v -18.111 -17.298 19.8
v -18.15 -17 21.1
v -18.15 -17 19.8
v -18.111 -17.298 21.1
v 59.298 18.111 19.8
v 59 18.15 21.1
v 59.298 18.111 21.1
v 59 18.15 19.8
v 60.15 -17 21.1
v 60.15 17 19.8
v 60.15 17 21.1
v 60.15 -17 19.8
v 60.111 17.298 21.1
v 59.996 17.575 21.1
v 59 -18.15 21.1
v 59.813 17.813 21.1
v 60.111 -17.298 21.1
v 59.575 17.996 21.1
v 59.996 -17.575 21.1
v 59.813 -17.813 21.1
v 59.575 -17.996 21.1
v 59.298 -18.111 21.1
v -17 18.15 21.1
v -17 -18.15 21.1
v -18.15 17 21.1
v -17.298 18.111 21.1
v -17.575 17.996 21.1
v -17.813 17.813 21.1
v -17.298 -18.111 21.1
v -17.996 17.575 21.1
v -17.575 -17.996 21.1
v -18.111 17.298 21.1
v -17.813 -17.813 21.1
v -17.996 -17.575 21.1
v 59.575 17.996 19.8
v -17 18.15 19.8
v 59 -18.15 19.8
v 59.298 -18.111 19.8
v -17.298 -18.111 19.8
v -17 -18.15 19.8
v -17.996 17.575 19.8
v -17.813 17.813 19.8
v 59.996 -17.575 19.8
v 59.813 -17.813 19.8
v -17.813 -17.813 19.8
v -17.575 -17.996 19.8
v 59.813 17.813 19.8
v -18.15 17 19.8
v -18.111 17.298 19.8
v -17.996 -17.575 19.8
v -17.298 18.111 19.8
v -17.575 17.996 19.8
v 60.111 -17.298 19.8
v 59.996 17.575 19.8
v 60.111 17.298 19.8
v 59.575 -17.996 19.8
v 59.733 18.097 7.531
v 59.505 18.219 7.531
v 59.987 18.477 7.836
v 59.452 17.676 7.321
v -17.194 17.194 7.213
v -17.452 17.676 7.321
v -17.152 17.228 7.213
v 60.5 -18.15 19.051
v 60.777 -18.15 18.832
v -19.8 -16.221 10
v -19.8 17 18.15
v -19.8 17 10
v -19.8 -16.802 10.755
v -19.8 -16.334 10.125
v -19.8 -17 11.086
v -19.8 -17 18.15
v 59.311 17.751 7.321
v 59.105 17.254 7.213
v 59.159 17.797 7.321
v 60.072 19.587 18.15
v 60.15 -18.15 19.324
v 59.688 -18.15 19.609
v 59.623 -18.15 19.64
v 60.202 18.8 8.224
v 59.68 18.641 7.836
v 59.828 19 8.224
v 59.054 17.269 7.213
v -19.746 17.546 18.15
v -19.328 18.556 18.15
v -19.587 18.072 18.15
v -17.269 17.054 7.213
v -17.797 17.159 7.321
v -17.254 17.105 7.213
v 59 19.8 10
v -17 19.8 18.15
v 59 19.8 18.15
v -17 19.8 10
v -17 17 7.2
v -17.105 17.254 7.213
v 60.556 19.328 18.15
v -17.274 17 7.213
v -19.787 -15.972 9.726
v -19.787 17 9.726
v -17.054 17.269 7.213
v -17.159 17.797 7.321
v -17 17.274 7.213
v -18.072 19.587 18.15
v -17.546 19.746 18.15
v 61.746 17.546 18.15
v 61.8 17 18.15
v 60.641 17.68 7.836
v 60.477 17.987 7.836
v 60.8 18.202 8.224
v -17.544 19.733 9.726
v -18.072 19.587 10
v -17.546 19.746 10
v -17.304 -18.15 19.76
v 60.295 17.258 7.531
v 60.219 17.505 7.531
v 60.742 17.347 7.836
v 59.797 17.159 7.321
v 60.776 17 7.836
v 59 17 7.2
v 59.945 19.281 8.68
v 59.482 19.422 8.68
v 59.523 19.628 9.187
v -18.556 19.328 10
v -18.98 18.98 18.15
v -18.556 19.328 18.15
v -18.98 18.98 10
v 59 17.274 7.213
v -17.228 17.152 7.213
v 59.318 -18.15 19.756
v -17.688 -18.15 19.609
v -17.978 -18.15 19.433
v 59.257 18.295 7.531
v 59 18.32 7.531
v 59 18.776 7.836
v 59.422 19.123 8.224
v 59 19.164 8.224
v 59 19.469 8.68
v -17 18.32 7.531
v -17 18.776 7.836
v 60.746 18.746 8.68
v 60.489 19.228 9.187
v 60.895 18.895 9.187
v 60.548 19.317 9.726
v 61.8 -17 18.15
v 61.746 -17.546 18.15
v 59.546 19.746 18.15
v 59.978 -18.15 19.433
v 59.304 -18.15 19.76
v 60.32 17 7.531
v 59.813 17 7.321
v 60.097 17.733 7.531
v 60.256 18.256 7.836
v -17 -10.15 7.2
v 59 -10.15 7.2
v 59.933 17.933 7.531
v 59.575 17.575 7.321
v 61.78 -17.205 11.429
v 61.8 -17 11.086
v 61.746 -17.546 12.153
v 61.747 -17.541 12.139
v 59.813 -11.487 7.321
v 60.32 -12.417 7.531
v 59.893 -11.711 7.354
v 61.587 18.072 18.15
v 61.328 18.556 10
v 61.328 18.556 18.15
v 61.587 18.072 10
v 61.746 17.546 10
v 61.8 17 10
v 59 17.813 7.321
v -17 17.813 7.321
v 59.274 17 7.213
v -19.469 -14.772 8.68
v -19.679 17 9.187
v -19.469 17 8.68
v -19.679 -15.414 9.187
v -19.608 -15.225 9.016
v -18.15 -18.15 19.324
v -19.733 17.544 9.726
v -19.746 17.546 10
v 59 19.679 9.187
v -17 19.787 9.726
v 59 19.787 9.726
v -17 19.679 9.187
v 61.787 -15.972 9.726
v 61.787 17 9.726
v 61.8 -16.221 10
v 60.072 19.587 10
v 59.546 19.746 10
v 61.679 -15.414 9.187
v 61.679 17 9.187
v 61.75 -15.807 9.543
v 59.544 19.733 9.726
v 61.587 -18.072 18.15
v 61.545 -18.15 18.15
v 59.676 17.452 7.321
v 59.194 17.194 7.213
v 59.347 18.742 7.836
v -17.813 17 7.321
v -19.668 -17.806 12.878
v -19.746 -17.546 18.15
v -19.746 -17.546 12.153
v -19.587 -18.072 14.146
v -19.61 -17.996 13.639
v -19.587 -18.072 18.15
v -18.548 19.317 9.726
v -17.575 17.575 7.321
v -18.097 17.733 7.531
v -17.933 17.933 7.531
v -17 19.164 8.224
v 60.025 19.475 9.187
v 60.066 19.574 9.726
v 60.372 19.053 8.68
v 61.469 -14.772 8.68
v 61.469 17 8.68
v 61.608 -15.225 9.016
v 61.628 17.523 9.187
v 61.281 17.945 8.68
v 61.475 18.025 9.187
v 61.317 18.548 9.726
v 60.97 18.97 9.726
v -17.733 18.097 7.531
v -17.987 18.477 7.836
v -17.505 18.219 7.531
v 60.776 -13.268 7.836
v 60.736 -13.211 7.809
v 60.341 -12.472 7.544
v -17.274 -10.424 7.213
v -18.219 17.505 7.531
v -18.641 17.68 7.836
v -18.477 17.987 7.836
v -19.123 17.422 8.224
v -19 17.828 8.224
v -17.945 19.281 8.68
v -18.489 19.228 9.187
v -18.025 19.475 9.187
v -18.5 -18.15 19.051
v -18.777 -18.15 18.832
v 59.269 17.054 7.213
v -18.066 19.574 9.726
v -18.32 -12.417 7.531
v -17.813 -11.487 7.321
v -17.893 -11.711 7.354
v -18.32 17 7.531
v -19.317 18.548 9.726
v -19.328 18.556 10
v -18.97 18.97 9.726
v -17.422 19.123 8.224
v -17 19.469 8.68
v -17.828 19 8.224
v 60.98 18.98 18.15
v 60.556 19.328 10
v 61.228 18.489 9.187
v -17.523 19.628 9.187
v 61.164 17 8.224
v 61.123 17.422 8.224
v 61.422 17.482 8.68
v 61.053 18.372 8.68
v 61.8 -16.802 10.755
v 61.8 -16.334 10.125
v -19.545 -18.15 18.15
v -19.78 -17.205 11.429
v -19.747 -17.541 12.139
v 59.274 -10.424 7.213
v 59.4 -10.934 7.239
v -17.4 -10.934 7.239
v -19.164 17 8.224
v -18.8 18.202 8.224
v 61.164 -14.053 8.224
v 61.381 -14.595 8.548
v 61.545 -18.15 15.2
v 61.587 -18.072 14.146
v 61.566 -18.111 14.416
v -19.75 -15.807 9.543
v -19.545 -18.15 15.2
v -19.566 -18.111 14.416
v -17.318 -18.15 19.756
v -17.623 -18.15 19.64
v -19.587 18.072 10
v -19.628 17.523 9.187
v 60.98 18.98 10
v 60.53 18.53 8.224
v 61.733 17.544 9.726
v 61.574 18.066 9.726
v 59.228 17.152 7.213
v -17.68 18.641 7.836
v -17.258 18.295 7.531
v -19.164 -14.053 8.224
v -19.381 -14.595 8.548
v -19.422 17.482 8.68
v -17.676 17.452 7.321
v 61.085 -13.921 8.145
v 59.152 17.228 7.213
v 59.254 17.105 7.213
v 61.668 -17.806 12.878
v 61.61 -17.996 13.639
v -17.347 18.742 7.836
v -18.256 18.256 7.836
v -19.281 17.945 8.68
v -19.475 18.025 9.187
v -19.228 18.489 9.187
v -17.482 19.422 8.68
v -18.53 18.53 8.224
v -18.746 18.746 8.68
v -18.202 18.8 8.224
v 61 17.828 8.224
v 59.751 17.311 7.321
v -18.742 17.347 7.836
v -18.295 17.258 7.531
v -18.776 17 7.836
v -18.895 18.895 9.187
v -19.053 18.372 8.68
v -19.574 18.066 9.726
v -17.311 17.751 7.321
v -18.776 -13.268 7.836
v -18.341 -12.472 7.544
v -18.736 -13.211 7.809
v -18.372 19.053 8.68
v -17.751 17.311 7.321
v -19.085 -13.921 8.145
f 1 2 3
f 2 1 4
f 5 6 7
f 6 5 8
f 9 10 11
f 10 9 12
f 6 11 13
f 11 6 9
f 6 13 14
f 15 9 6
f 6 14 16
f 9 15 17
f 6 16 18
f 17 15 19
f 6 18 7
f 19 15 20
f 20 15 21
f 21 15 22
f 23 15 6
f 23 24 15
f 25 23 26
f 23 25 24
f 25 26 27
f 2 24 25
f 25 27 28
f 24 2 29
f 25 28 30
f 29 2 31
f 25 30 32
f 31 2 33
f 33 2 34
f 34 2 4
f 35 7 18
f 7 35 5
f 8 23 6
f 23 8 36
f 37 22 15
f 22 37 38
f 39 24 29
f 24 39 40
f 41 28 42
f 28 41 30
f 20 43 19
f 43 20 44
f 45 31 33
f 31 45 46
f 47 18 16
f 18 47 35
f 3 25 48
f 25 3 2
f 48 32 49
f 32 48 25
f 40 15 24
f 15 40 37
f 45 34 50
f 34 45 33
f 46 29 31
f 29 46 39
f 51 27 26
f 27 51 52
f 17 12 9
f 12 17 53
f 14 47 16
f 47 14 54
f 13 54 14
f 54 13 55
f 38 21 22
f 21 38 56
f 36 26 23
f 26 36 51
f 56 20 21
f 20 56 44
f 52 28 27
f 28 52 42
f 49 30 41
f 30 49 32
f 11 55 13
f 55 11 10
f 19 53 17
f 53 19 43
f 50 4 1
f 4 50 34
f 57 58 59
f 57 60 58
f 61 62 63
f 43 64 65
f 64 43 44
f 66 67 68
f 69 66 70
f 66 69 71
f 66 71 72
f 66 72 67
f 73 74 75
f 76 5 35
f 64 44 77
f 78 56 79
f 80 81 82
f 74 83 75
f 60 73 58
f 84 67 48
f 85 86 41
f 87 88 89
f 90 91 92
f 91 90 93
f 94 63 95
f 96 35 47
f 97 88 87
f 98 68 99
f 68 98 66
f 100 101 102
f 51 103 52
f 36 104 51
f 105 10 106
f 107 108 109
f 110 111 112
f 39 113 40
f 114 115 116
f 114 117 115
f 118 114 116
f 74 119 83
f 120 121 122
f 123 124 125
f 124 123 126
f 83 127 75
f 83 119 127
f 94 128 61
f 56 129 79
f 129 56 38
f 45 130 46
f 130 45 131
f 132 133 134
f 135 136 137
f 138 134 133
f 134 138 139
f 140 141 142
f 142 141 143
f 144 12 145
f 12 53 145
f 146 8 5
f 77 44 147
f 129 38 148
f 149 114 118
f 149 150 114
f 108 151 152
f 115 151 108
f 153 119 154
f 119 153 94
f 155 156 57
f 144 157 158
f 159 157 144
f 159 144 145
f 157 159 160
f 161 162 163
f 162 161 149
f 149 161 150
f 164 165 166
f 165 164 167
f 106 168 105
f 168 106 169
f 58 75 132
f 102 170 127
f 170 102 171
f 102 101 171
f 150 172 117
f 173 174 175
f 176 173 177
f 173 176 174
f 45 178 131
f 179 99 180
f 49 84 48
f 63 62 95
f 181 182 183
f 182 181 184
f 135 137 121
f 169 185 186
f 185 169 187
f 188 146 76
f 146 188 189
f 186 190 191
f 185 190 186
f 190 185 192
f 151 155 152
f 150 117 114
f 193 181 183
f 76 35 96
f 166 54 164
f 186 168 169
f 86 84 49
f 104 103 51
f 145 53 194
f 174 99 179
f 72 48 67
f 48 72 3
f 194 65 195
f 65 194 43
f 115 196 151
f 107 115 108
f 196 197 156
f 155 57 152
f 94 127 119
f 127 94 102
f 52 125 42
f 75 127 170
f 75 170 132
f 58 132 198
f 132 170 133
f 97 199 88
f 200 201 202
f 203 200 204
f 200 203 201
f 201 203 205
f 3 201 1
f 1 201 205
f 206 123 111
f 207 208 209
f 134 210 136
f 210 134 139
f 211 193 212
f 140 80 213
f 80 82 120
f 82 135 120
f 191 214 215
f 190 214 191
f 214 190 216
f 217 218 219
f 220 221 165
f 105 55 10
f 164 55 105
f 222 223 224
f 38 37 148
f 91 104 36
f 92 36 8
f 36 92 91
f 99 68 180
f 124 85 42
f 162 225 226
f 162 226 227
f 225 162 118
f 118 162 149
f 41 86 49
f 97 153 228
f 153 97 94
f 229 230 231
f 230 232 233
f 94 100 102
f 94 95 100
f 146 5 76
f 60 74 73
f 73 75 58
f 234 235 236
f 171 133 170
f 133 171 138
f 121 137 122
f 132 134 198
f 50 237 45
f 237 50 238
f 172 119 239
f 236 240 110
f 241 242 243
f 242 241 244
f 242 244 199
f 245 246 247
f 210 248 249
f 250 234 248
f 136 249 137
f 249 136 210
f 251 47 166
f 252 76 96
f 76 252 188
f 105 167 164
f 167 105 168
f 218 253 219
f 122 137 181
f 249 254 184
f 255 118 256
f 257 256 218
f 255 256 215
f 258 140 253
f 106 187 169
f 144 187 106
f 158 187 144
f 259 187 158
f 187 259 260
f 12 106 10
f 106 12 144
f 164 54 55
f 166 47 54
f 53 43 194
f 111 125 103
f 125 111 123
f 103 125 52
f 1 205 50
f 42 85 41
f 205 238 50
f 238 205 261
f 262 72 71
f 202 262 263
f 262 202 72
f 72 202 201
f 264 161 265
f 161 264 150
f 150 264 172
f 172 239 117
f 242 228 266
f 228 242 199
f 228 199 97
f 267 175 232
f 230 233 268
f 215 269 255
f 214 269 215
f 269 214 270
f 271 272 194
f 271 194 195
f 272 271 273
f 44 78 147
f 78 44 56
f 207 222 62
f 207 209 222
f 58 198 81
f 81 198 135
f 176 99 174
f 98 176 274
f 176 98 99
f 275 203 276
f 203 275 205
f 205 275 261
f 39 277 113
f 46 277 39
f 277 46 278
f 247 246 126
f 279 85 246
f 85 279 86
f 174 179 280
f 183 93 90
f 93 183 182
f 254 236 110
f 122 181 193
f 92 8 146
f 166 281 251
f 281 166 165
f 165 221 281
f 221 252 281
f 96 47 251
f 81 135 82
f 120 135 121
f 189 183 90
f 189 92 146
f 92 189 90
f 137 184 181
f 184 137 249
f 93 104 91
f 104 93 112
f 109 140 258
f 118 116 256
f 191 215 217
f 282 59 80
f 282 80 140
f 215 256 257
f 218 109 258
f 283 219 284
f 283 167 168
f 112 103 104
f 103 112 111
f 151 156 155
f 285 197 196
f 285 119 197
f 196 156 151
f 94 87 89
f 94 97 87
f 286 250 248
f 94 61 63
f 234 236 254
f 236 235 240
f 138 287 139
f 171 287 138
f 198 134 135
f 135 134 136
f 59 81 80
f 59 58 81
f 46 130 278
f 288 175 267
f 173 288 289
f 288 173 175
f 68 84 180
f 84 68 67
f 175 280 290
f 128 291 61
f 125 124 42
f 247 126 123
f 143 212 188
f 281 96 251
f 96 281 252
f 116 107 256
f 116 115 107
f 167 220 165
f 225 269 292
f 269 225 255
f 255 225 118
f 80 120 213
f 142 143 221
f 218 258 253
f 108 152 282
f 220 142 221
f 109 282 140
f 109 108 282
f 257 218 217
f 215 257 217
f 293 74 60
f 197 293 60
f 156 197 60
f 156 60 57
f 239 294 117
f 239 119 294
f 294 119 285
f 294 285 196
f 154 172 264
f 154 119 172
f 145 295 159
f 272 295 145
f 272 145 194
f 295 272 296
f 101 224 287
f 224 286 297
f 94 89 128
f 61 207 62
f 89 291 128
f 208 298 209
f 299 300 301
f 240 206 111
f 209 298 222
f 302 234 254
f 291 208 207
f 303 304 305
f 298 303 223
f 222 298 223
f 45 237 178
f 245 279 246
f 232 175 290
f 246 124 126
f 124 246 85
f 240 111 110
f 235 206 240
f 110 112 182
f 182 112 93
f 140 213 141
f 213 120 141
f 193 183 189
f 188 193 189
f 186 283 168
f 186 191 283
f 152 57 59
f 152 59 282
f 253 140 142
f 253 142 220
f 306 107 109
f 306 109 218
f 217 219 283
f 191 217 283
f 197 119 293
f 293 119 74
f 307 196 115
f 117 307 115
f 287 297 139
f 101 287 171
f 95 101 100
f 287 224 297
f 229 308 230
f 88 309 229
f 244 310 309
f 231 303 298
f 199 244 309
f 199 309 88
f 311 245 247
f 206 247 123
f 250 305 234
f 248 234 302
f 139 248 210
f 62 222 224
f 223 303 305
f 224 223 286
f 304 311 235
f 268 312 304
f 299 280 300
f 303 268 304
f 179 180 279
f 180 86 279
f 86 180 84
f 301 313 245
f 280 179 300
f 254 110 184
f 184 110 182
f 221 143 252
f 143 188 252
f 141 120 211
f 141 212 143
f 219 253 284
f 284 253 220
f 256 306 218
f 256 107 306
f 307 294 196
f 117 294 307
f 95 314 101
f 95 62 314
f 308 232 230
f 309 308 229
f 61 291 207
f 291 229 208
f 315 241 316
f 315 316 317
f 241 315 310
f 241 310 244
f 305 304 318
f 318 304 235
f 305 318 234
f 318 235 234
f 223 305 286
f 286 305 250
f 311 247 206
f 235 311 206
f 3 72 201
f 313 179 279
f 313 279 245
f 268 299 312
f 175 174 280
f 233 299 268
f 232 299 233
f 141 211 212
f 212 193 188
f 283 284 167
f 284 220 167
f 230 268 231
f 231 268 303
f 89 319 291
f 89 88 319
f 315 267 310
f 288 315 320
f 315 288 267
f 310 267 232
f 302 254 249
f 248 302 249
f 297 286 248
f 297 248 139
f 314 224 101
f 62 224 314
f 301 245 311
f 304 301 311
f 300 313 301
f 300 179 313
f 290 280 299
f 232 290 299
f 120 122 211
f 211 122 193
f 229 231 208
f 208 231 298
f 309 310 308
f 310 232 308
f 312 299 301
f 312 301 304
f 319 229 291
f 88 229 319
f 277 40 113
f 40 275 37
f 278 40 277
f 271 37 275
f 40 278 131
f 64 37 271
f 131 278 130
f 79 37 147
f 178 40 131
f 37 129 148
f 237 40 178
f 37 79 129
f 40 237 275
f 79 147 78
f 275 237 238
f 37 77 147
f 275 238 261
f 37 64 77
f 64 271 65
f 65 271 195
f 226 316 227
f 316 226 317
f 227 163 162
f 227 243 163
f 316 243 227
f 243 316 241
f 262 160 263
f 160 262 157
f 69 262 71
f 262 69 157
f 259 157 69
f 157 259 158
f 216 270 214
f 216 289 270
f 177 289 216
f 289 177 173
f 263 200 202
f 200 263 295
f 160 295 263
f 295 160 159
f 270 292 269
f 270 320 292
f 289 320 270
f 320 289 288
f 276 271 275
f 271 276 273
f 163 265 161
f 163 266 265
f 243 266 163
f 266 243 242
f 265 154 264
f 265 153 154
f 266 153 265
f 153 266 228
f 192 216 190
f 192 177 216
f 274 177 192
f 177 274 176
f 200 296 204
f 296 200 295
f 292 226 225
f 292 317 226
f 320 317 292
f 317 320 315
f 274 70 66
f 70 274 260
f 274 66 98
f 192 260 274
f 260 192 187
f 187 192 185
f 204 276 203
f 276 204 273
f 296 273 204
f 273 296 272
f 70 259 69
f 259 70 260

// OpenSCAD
include <gridfinity_modules.scad>

// X dimension subdivisions
default_chambers = 1;

// Include overhang for labeling
default_withLabel = "disabled"; //[disabled: no label, left: left aligned label, right: right aligned label, center: center aligned label, leftchamber: left aligned chamber label, rightchamber: right aligned chamber label, centerchamber: center aligned chamber label]
// Width of the label in number of units, or zero for full width
default_labelWidth = 0; // 0.01
// Include larger corner fillet
default_fingerslide = true;
// radius of the corner fillet
default_fingerslide_radius = 8;
// Set magnet diameter and depth to 0 to print without magnet holes
// (Zack's design uses magnet diameter of 6.5)
default_magnet_diameter = 6.5;  // .1
// (Zack's design uses depth of 6)
default_screw_depth = 6;
// Minimum thickness above cutouts in base (Zack's design is effectively 1.2)
default_floor_thickness = 1.2;
// Thickness of outer walls (Zack's design is 0.95 mm)
default_wall_thickness = 0.95;
// Use rectangular inset for better bridging/printability
default_hole_overhang_remedy = false;
// Save material with thinner floor (only if no magnets, screws, or finger-slide used)
default_efficient_floor = false;
// Half-pitch base pads for offset stacking
default_half_pitch = false;
// Might want to remove inner lip of cup
default_lip_style = "normal";
// Limit attachments (magnets and scres) to box corners for faster printing.
default_box_corner_attachments_only = false;
// Removes the base grid from inside the shape
default_flat_base = false;

basic_cup(
  num_x=2,
  num_y=1,
  num_z=3,
  chambers=default_chambers,
  withLabel=default_withLabel,
  labelWidth=default_labelWidth,
  magnet_diameter=default_magnet_diameter,
  screw_depth=default_screw_depth,
  floor_thickness=default_floor_thickness,
  wall_thickness=default_wall_thickness,
  hole_overhang_remedy=default_hole_overhang_remedy,
  efficient_floor=default_efficient_floor,
  half_pitch=default_half_pitch,
  lip_style=default_lip_style,
  box_corner_attachments_only=default_box_corner_attachments_only,
  flat_base = default_flat_base
);


// It's recommended that all parameters other than x, y, z size should be specified by keyword 
// and not by position.  The number of parameters makes positional parameters error prone, and
// additional parameters may be added over time and break things.
module basic_cup(
  num_x,
  num_y,
  num_z,
  chambers=default_chambers,
  withLabel=default_withLabel,
  labelWidth=default_labelWidth,
  fingerslide=default_fingerslide,
  fingerslide_radius=default_fingerslide_radius,
  magnet_diameter=default_magnet_diameter,
  screw_depth=default_screw_depth,
  floor_thickness=default_floor_thickness,
  wall_thickness=default_wall_thickness,
  hole_overhang_remedy=default_hole_overhang_remedy,
  efficient_floor=default_efficient_floor,
  half_pitch=default_half_pitch,
  lip_style=default_lip_style,
  box_corner_attachments_only=default_box_corner_attachments_only,
  flat_base = default_flat_base
  ) {
  num_separators = chambers-1;
  sep_pitch = num_x/(num_separators+1);
  separator_positions = num_separators < 1 ? [] : [ for (i=[1:num_separators]) i*sep_pitch ];
  
  difference() {
    grid_block(num_x, num_y, num_z, magnet_diameter, screw_depth, hole_overhang_remedy=hole_overhang_remedy, half_pitch=half_pitch, box_corner_attachments_only=box_corner_attachments_only, flat_base=flat_base);
    color("red") partitioned_cavity(num_x, num_y, num_z, withLabel=withLabel,
    labelWidth=labelWidth, fingerslide=fingerslide, magnet_diameter=magnet_diameter, 
    screw_depth=screw_depth, floor_thickness=floor_thickness, wall_thickness=wall_thickness,
    efficient_floor=efficient_floor, separator_positions=separator_positions, lip_style=lip_style, flat_base=flat_base);
  }
}


// separator positions are defined in units from the left side
module irregular_cup(
  num_x,
  num_y,
  num_z,
  withLabel=default_withLabel,
  labelWidth=default_labelWidth,
  fingerslide=default_fingerslide,
  fingerslide_radius=default_fingerslide_radius,
  magnet_diameter=default_magnet_diameter,
  screw_depth=default_screw_depth,
  floor_thickness=default_floor_thickness,
  wall_thickness=default_wall_thickness,
  hole_overhang_remedy=default_hole_overhang_remedy,
  efficient_floor=default_efficient_floor,
  half_pitch=default_half_pitch,
  separator_positions=[],
  lip_style=default_lip_style, 
  flat_base=default_flat_base
  ) {
  difference() {
    grid_block(num_x, num_y, num_z, magnet_diameter, screw_depth, hole_overhang_remedy=hole_overhang_remedy, half_pitch=half_pitch, box_corner_attachments_only=box_corner_attachments_only, flat_base=flat_base);
    color("red") partitioned_cavity(num_x, num_y, num_z, withLabel=withLabel,
    labelWidth=labelWidth, fingerslide=fingerslide, fingerslide_radius=fingerslide_radius, magnet_diameter=magnet_diameter, 
    screw_depth=screw_depth, floor_thickness=floor_thickness, wall_thickness=wall_thickness,
    efficient_floor=efficient_floor, separator_positions=separator_positions, lip_style=lip_style, flat_base=flat_base);
  }
}


module partitioned_cavity(num_x, num_y, num_z, withLabel=default_withLabel, 
    labelWidth=default_labelWidth, fingerslide=default_fingerslide,  fingerslide_radius=default_fingerslide_radius,
    magnet_diameter=default_magnet_diameter, screw_depth=default_screw_depth, 
    floor_thickness=default_floor_thickness, wall_thickness=default_wall_thickness,
    efficient_floor=default_efficient_floor, separator_positions=[], lip_style=default_lip_style, flat_base=default_flat_base) {
  // cavity with removed segments so that we leave dividing walls behind
  gp = gridfinity_pitch;
  outer_wall_th = 1.8;  // cavity is this far away from the 42mm 'ideal' block
  inner_wall_th =1.2;
    
  bar_d = 1.2;
  zpoint = gridfinity_zpitch*num_z;
  
  yz = [[ (num_y-0.5)*gridfinity_pitch-14, zpoint-bar_d/2 ],
    [ (num_y-0.5)*gridfinity_pitch, zpoint-bar_d/2 ],
    [ (num_y-0.5)*gridfinity_pitch, zpoint-bar_d/2-10.18 ]
  ];
  
  cavity_xsize = gp*num_x-2*outer_wall_th;

  difference() {
    !basic_cavity(num_x, num_y, num_z, fingerslide=fingerslide, fingerslide_radius=fingerslide_radius, magnet_diameter=magnet_diameter,
    screw_depth=screw_depth, floor_thickness=floor_thickness, wall_thickness=wall_thickness,
    efficient_floor=efficient_floor, lip_style=lip_style, flat_base=flat_base);
    
    if (len(separator_positions) > 0) {
      for (i=[0:len(separator_positions)-1]) {
        translate([gp*(-0.5+separator_positions[i])-inner_wall_th/2, -gp/2, 0]) cube([inner_wall_th, gp*num_y, gridfinity_zpitch*(num_z+1)]);
      }
    }
    
    // this is the label
    if (withLabel != "disabled") {
      // calcualte list of chambers. 
      chamberWidths = len(separator_positions) < 1 || 
        labelWidth == 0 ||
        withLabel == "left" ||
        withLabel == "center" ||
        withLabel == "right" ?
        [ num_x ] // single chamber equal to the bin length
        : [ for (i=[0:len(separator_positions)]) (i==len(separator_positions) ? num_x : separator_positions[i]) - (i==0 ? 0 : separator_positions[i-1]) ];
        
      for (i=[0:len(chamberWidths)-1]) {
        chamberStart = i == 0 ? 0 : separator_positions[i-1];
        chamberWidth = chamberWidths[i];
        label_num_x = (labelWidth == 0 || labelWidth > chamberWidth) ? chamberWidth : labelWidth;
        label_pos_x = (withLabel == "center" || withLabel == "centerchamber" )? (chamberWidth - label_num_x) / 2 
                        : (withLabel == "right" || withLabel == "rightchamber" )? chamberWidth - label_num_x 
                        : 0 ;

        hull() for (i=[0,1, 2])
        translate([(-gridfinity_pitch/2) + ((chamberStart + label_pos_x) * gridfinity_pitch), yz[i][0], yz[i][1]])
        rotate([0, 90, 0])
        union(){
            tz(abs(label_num_x)*gridfinity_pitch)
            sphere(d=bar_d, $fn=24);
            sphere(d=bar_d, $fn=24);
        }
      }
    }
  }
}


module basic_cavity(num_x, num_y, num_z, fingerslide=default_fingerslide,  fingerslide_radius=default_fingerslide_radius,
    magnet_diameter=default_magnet_diameter, screw_depth=default_screw_depth, 
    floor_thickness=default_floor_thickness, wall_thickness=default_wall_thickness,
    efficient_floor=default_efficient_floor, lip_style=default_lip_style, flat_base=default_flat_base) {
  eps = 0.1;
  // I couldn't think of a good name for this ('q') but effectively it's the
  // size of the overhang that produces a wall thickness that's less than the lip
  // arount the top inside edge.
  q = 1.65-wall_thickness+0.95;  // default 1.65 corresponds to wall thickness of 0.95
  q2 = 0.1;
  inner_lip_ht = 1.2;
  part_ht = 5;  // height of partition between cells
  // the Z height of the bottom of the inside edge of the standard lip
  zpoint = max(part_ht+floor_thickness, gridfinity_zpitch*num_z-inner_lip_ht);
  facets = 13;
  mag_ht = magnet_diameter > 0 ? 2.4: 0;
  m3_ht = screw_depth;
  efloor = efficient_floor && magnet_diameter == 0 && screw_depth == 0 && !fingerslide;
  seventeen = gridfinity_pitch/2-4;
  
  floorht = max(mag_ht, m3_ht, part_ht) + floor_thickness;
  
  // replace "normal" with "reduced" if z-height is less than 1.8
  lip_style2 = (num_z < 1.8 && lip_style == "normal") ? "reduced" : lip_style;
  // replace "reduced" with "none" if z-height is less than 1.1
  lip_style3 = (num_z < 1.2 && lip_style2 == "reduced") ? "none" : lip_style2;
  
  difference() {
    union() {
      // cut out inside edge of standard lip
      hull() cornercopy(seventeen, num_x, num_y) {
        tz(zpoint-eps) cylinder(d=2.3, h=inner_lip_ht+2*eps, $fn=24); // lip
      }
      
      hull() cornercopy(seventeen, num_x, num_y) {
        // create bevels below the lip
        if (lip_style3 == "reduced") {
          tz(zpoint+1.8) cylinder(d=3.7, h=0.1, $fn=32); // transition from lip (where top of lip would be) ...
          // radius increases by (2.3+2*q-3.7)/2 = q-1.4/2 = q-0.7
          tz(zpoint-(q-0.7)+1.9-q2) cylinder(d=2.3+2*q, h=q2, $fn=32);   // ... to top of thin wall ...
        }
        else if (lip_style3 == "none") {
          tz(zpoint) cylinder(d=2.3+2*q, h=6, $fn=32);   // remove entire lip
        }
        else {  // normal
          tz(zpoint-0.1) cylinder(d=2.3, h=0.1, $fn=24);       // transition from lip ...
          tz(zpoint-q-q2) cylinder(d=2.3+2*q, h=q2, $fn=32);   // ... to top of thin wall ...
        }
        // create rounded bottom of bowl (8.5 is high enough to not expose gaps)
        tz(2.3/2+q+floorht) sphere(d=2.3+2*q, $fn=32);       // .. to bottom of thin wall and floor
        tz(2.3/2+q+floorht) mirror([0, 0, 1]) cylinder(d1=2.3+2*q, d2=0, h=1.15+q, $fn=32);
      }
    }
    
    // cut away from the negative to leave behind wall to make it easier to remove piece
    pivot_z = 13.6-0.45+floorht-5+seventeen-17;
    pivot_y = -10;
    
    // rounded inside bottom
    if(fingerslide){
      translate([0, (
            lip_style3 == "reduced" ? -0.7 
            : (lip_style3=="none" ? seventeen+1.15-gridfinity_pitch/2+0.25+wall_thickness
            : 0
            ) ), 0])
        translate([-(gridfinity_pitch),-seventeen-1.15, floorht])
        difference(){
          union(){
            translate([0,-fingerslide_radius, 0])
              cube([gridfinity_pitch*(num_x+1), fingerslide_radius,  gridfinity_zpitch*num_z]);
            translate([0,-1, -1])
              cube([gridfinity_pitch*(num_x+1), fingerslide_radius+1,  fingerslide_radius+1]);
          }
          translate([0,+fingerslide_radius, fingerslide_radius])
            rotate([90, 0, 90])
            cylinder(h = gridfinity_pitch*(num_x+1), r=fingerslide_radius, $fn=64);
      }      
    }
  }
  
  // cut away side lips if num_x is less than 1
  if (num_x < 1) {
    hull() for (x=[-gridfinity_pitch/2+1.5+0.25+wall_thickness, -gridfinity_pitch/2+num_x*gridfinity_pitch-1.5-0.25-wall_thickness])
    for (y=[-10, (num_y-0.5)*gridfinity_pitch-seventeen])
    translate([x, y, (floorht+7*num_z)/2])
    cylinder(d=3, h=7*num_z, $fn=24);
  }
  
  if (efloor) {
    if (num_x < 1) {
      gridcopy(1, num_y) {
        tz(floor_thickness) intersection() {
          hull() cornercopy(seventeen-0.5) cylinder(r=1, h=5, $fn=32);
          translate([gridfinity_pitch*(-1+num_x), 0, 0]) hull() cornercopy(seventeen-0.5) cylinder(r=1, h=5, $fn=32);
        }
      
        // tapered top portion
        intersection() {
          hull() {
            tz(3) cornercopy(seventeen-0.5) cylinder(r=1, h=1, $fn=32);
            tz(5) cornercopy(seventeen+2.5-1.15-q) cylinder(r=1.15+q, h=4, $fn=32);
          }
          translate([gridfinity_pitch*(-1+num_x), 0, 0]) hull() {
            tz(3) cornercopy(seventeen-0.5) cylinder(r=1, h=1, $fn=32);
            tz(5) cornercopy(seventeen+2.5-1.15-q) cylinder(r=1.15+q, h=4, $fn=32);
          }
        }
      }
    } else {
      _gridx = flat_base ? 1 : num_x;
      _gridCornerx = flat_base ? num_x : 1;
      _gridy = flat_base ? 1 : num_y;
      _gridCornery = flat_base ? num_y : 1;
      
      // establishes floor
      gridcopy(_gridx, _gridy) hull() tz(floor_thickness) gridcopycorners(_gridCornerx, _gridCornery, seventeen-0.5, flat_base) cylinder(r=1, h=5, $fn=32);
   
      // tapered top portion
      gridcopy(_gridx, _gridy) hull() {
        tz(3) gridcopycorners(_gridCornerx, _gridCornery, seventeen-0.5, flat_base) cylinder(r=1, h=1, $fn=32);
        tz(5-(+2.5-1.15-q)) gridcopycorners(_gridCornerx, _gridCornery, seventeen, flat_base) cylinder(r=1.15+q, h=4, $fn=32);
      }
    }
  }
}

module tz(z) {
  translate([0, 0, z]) children();
}
